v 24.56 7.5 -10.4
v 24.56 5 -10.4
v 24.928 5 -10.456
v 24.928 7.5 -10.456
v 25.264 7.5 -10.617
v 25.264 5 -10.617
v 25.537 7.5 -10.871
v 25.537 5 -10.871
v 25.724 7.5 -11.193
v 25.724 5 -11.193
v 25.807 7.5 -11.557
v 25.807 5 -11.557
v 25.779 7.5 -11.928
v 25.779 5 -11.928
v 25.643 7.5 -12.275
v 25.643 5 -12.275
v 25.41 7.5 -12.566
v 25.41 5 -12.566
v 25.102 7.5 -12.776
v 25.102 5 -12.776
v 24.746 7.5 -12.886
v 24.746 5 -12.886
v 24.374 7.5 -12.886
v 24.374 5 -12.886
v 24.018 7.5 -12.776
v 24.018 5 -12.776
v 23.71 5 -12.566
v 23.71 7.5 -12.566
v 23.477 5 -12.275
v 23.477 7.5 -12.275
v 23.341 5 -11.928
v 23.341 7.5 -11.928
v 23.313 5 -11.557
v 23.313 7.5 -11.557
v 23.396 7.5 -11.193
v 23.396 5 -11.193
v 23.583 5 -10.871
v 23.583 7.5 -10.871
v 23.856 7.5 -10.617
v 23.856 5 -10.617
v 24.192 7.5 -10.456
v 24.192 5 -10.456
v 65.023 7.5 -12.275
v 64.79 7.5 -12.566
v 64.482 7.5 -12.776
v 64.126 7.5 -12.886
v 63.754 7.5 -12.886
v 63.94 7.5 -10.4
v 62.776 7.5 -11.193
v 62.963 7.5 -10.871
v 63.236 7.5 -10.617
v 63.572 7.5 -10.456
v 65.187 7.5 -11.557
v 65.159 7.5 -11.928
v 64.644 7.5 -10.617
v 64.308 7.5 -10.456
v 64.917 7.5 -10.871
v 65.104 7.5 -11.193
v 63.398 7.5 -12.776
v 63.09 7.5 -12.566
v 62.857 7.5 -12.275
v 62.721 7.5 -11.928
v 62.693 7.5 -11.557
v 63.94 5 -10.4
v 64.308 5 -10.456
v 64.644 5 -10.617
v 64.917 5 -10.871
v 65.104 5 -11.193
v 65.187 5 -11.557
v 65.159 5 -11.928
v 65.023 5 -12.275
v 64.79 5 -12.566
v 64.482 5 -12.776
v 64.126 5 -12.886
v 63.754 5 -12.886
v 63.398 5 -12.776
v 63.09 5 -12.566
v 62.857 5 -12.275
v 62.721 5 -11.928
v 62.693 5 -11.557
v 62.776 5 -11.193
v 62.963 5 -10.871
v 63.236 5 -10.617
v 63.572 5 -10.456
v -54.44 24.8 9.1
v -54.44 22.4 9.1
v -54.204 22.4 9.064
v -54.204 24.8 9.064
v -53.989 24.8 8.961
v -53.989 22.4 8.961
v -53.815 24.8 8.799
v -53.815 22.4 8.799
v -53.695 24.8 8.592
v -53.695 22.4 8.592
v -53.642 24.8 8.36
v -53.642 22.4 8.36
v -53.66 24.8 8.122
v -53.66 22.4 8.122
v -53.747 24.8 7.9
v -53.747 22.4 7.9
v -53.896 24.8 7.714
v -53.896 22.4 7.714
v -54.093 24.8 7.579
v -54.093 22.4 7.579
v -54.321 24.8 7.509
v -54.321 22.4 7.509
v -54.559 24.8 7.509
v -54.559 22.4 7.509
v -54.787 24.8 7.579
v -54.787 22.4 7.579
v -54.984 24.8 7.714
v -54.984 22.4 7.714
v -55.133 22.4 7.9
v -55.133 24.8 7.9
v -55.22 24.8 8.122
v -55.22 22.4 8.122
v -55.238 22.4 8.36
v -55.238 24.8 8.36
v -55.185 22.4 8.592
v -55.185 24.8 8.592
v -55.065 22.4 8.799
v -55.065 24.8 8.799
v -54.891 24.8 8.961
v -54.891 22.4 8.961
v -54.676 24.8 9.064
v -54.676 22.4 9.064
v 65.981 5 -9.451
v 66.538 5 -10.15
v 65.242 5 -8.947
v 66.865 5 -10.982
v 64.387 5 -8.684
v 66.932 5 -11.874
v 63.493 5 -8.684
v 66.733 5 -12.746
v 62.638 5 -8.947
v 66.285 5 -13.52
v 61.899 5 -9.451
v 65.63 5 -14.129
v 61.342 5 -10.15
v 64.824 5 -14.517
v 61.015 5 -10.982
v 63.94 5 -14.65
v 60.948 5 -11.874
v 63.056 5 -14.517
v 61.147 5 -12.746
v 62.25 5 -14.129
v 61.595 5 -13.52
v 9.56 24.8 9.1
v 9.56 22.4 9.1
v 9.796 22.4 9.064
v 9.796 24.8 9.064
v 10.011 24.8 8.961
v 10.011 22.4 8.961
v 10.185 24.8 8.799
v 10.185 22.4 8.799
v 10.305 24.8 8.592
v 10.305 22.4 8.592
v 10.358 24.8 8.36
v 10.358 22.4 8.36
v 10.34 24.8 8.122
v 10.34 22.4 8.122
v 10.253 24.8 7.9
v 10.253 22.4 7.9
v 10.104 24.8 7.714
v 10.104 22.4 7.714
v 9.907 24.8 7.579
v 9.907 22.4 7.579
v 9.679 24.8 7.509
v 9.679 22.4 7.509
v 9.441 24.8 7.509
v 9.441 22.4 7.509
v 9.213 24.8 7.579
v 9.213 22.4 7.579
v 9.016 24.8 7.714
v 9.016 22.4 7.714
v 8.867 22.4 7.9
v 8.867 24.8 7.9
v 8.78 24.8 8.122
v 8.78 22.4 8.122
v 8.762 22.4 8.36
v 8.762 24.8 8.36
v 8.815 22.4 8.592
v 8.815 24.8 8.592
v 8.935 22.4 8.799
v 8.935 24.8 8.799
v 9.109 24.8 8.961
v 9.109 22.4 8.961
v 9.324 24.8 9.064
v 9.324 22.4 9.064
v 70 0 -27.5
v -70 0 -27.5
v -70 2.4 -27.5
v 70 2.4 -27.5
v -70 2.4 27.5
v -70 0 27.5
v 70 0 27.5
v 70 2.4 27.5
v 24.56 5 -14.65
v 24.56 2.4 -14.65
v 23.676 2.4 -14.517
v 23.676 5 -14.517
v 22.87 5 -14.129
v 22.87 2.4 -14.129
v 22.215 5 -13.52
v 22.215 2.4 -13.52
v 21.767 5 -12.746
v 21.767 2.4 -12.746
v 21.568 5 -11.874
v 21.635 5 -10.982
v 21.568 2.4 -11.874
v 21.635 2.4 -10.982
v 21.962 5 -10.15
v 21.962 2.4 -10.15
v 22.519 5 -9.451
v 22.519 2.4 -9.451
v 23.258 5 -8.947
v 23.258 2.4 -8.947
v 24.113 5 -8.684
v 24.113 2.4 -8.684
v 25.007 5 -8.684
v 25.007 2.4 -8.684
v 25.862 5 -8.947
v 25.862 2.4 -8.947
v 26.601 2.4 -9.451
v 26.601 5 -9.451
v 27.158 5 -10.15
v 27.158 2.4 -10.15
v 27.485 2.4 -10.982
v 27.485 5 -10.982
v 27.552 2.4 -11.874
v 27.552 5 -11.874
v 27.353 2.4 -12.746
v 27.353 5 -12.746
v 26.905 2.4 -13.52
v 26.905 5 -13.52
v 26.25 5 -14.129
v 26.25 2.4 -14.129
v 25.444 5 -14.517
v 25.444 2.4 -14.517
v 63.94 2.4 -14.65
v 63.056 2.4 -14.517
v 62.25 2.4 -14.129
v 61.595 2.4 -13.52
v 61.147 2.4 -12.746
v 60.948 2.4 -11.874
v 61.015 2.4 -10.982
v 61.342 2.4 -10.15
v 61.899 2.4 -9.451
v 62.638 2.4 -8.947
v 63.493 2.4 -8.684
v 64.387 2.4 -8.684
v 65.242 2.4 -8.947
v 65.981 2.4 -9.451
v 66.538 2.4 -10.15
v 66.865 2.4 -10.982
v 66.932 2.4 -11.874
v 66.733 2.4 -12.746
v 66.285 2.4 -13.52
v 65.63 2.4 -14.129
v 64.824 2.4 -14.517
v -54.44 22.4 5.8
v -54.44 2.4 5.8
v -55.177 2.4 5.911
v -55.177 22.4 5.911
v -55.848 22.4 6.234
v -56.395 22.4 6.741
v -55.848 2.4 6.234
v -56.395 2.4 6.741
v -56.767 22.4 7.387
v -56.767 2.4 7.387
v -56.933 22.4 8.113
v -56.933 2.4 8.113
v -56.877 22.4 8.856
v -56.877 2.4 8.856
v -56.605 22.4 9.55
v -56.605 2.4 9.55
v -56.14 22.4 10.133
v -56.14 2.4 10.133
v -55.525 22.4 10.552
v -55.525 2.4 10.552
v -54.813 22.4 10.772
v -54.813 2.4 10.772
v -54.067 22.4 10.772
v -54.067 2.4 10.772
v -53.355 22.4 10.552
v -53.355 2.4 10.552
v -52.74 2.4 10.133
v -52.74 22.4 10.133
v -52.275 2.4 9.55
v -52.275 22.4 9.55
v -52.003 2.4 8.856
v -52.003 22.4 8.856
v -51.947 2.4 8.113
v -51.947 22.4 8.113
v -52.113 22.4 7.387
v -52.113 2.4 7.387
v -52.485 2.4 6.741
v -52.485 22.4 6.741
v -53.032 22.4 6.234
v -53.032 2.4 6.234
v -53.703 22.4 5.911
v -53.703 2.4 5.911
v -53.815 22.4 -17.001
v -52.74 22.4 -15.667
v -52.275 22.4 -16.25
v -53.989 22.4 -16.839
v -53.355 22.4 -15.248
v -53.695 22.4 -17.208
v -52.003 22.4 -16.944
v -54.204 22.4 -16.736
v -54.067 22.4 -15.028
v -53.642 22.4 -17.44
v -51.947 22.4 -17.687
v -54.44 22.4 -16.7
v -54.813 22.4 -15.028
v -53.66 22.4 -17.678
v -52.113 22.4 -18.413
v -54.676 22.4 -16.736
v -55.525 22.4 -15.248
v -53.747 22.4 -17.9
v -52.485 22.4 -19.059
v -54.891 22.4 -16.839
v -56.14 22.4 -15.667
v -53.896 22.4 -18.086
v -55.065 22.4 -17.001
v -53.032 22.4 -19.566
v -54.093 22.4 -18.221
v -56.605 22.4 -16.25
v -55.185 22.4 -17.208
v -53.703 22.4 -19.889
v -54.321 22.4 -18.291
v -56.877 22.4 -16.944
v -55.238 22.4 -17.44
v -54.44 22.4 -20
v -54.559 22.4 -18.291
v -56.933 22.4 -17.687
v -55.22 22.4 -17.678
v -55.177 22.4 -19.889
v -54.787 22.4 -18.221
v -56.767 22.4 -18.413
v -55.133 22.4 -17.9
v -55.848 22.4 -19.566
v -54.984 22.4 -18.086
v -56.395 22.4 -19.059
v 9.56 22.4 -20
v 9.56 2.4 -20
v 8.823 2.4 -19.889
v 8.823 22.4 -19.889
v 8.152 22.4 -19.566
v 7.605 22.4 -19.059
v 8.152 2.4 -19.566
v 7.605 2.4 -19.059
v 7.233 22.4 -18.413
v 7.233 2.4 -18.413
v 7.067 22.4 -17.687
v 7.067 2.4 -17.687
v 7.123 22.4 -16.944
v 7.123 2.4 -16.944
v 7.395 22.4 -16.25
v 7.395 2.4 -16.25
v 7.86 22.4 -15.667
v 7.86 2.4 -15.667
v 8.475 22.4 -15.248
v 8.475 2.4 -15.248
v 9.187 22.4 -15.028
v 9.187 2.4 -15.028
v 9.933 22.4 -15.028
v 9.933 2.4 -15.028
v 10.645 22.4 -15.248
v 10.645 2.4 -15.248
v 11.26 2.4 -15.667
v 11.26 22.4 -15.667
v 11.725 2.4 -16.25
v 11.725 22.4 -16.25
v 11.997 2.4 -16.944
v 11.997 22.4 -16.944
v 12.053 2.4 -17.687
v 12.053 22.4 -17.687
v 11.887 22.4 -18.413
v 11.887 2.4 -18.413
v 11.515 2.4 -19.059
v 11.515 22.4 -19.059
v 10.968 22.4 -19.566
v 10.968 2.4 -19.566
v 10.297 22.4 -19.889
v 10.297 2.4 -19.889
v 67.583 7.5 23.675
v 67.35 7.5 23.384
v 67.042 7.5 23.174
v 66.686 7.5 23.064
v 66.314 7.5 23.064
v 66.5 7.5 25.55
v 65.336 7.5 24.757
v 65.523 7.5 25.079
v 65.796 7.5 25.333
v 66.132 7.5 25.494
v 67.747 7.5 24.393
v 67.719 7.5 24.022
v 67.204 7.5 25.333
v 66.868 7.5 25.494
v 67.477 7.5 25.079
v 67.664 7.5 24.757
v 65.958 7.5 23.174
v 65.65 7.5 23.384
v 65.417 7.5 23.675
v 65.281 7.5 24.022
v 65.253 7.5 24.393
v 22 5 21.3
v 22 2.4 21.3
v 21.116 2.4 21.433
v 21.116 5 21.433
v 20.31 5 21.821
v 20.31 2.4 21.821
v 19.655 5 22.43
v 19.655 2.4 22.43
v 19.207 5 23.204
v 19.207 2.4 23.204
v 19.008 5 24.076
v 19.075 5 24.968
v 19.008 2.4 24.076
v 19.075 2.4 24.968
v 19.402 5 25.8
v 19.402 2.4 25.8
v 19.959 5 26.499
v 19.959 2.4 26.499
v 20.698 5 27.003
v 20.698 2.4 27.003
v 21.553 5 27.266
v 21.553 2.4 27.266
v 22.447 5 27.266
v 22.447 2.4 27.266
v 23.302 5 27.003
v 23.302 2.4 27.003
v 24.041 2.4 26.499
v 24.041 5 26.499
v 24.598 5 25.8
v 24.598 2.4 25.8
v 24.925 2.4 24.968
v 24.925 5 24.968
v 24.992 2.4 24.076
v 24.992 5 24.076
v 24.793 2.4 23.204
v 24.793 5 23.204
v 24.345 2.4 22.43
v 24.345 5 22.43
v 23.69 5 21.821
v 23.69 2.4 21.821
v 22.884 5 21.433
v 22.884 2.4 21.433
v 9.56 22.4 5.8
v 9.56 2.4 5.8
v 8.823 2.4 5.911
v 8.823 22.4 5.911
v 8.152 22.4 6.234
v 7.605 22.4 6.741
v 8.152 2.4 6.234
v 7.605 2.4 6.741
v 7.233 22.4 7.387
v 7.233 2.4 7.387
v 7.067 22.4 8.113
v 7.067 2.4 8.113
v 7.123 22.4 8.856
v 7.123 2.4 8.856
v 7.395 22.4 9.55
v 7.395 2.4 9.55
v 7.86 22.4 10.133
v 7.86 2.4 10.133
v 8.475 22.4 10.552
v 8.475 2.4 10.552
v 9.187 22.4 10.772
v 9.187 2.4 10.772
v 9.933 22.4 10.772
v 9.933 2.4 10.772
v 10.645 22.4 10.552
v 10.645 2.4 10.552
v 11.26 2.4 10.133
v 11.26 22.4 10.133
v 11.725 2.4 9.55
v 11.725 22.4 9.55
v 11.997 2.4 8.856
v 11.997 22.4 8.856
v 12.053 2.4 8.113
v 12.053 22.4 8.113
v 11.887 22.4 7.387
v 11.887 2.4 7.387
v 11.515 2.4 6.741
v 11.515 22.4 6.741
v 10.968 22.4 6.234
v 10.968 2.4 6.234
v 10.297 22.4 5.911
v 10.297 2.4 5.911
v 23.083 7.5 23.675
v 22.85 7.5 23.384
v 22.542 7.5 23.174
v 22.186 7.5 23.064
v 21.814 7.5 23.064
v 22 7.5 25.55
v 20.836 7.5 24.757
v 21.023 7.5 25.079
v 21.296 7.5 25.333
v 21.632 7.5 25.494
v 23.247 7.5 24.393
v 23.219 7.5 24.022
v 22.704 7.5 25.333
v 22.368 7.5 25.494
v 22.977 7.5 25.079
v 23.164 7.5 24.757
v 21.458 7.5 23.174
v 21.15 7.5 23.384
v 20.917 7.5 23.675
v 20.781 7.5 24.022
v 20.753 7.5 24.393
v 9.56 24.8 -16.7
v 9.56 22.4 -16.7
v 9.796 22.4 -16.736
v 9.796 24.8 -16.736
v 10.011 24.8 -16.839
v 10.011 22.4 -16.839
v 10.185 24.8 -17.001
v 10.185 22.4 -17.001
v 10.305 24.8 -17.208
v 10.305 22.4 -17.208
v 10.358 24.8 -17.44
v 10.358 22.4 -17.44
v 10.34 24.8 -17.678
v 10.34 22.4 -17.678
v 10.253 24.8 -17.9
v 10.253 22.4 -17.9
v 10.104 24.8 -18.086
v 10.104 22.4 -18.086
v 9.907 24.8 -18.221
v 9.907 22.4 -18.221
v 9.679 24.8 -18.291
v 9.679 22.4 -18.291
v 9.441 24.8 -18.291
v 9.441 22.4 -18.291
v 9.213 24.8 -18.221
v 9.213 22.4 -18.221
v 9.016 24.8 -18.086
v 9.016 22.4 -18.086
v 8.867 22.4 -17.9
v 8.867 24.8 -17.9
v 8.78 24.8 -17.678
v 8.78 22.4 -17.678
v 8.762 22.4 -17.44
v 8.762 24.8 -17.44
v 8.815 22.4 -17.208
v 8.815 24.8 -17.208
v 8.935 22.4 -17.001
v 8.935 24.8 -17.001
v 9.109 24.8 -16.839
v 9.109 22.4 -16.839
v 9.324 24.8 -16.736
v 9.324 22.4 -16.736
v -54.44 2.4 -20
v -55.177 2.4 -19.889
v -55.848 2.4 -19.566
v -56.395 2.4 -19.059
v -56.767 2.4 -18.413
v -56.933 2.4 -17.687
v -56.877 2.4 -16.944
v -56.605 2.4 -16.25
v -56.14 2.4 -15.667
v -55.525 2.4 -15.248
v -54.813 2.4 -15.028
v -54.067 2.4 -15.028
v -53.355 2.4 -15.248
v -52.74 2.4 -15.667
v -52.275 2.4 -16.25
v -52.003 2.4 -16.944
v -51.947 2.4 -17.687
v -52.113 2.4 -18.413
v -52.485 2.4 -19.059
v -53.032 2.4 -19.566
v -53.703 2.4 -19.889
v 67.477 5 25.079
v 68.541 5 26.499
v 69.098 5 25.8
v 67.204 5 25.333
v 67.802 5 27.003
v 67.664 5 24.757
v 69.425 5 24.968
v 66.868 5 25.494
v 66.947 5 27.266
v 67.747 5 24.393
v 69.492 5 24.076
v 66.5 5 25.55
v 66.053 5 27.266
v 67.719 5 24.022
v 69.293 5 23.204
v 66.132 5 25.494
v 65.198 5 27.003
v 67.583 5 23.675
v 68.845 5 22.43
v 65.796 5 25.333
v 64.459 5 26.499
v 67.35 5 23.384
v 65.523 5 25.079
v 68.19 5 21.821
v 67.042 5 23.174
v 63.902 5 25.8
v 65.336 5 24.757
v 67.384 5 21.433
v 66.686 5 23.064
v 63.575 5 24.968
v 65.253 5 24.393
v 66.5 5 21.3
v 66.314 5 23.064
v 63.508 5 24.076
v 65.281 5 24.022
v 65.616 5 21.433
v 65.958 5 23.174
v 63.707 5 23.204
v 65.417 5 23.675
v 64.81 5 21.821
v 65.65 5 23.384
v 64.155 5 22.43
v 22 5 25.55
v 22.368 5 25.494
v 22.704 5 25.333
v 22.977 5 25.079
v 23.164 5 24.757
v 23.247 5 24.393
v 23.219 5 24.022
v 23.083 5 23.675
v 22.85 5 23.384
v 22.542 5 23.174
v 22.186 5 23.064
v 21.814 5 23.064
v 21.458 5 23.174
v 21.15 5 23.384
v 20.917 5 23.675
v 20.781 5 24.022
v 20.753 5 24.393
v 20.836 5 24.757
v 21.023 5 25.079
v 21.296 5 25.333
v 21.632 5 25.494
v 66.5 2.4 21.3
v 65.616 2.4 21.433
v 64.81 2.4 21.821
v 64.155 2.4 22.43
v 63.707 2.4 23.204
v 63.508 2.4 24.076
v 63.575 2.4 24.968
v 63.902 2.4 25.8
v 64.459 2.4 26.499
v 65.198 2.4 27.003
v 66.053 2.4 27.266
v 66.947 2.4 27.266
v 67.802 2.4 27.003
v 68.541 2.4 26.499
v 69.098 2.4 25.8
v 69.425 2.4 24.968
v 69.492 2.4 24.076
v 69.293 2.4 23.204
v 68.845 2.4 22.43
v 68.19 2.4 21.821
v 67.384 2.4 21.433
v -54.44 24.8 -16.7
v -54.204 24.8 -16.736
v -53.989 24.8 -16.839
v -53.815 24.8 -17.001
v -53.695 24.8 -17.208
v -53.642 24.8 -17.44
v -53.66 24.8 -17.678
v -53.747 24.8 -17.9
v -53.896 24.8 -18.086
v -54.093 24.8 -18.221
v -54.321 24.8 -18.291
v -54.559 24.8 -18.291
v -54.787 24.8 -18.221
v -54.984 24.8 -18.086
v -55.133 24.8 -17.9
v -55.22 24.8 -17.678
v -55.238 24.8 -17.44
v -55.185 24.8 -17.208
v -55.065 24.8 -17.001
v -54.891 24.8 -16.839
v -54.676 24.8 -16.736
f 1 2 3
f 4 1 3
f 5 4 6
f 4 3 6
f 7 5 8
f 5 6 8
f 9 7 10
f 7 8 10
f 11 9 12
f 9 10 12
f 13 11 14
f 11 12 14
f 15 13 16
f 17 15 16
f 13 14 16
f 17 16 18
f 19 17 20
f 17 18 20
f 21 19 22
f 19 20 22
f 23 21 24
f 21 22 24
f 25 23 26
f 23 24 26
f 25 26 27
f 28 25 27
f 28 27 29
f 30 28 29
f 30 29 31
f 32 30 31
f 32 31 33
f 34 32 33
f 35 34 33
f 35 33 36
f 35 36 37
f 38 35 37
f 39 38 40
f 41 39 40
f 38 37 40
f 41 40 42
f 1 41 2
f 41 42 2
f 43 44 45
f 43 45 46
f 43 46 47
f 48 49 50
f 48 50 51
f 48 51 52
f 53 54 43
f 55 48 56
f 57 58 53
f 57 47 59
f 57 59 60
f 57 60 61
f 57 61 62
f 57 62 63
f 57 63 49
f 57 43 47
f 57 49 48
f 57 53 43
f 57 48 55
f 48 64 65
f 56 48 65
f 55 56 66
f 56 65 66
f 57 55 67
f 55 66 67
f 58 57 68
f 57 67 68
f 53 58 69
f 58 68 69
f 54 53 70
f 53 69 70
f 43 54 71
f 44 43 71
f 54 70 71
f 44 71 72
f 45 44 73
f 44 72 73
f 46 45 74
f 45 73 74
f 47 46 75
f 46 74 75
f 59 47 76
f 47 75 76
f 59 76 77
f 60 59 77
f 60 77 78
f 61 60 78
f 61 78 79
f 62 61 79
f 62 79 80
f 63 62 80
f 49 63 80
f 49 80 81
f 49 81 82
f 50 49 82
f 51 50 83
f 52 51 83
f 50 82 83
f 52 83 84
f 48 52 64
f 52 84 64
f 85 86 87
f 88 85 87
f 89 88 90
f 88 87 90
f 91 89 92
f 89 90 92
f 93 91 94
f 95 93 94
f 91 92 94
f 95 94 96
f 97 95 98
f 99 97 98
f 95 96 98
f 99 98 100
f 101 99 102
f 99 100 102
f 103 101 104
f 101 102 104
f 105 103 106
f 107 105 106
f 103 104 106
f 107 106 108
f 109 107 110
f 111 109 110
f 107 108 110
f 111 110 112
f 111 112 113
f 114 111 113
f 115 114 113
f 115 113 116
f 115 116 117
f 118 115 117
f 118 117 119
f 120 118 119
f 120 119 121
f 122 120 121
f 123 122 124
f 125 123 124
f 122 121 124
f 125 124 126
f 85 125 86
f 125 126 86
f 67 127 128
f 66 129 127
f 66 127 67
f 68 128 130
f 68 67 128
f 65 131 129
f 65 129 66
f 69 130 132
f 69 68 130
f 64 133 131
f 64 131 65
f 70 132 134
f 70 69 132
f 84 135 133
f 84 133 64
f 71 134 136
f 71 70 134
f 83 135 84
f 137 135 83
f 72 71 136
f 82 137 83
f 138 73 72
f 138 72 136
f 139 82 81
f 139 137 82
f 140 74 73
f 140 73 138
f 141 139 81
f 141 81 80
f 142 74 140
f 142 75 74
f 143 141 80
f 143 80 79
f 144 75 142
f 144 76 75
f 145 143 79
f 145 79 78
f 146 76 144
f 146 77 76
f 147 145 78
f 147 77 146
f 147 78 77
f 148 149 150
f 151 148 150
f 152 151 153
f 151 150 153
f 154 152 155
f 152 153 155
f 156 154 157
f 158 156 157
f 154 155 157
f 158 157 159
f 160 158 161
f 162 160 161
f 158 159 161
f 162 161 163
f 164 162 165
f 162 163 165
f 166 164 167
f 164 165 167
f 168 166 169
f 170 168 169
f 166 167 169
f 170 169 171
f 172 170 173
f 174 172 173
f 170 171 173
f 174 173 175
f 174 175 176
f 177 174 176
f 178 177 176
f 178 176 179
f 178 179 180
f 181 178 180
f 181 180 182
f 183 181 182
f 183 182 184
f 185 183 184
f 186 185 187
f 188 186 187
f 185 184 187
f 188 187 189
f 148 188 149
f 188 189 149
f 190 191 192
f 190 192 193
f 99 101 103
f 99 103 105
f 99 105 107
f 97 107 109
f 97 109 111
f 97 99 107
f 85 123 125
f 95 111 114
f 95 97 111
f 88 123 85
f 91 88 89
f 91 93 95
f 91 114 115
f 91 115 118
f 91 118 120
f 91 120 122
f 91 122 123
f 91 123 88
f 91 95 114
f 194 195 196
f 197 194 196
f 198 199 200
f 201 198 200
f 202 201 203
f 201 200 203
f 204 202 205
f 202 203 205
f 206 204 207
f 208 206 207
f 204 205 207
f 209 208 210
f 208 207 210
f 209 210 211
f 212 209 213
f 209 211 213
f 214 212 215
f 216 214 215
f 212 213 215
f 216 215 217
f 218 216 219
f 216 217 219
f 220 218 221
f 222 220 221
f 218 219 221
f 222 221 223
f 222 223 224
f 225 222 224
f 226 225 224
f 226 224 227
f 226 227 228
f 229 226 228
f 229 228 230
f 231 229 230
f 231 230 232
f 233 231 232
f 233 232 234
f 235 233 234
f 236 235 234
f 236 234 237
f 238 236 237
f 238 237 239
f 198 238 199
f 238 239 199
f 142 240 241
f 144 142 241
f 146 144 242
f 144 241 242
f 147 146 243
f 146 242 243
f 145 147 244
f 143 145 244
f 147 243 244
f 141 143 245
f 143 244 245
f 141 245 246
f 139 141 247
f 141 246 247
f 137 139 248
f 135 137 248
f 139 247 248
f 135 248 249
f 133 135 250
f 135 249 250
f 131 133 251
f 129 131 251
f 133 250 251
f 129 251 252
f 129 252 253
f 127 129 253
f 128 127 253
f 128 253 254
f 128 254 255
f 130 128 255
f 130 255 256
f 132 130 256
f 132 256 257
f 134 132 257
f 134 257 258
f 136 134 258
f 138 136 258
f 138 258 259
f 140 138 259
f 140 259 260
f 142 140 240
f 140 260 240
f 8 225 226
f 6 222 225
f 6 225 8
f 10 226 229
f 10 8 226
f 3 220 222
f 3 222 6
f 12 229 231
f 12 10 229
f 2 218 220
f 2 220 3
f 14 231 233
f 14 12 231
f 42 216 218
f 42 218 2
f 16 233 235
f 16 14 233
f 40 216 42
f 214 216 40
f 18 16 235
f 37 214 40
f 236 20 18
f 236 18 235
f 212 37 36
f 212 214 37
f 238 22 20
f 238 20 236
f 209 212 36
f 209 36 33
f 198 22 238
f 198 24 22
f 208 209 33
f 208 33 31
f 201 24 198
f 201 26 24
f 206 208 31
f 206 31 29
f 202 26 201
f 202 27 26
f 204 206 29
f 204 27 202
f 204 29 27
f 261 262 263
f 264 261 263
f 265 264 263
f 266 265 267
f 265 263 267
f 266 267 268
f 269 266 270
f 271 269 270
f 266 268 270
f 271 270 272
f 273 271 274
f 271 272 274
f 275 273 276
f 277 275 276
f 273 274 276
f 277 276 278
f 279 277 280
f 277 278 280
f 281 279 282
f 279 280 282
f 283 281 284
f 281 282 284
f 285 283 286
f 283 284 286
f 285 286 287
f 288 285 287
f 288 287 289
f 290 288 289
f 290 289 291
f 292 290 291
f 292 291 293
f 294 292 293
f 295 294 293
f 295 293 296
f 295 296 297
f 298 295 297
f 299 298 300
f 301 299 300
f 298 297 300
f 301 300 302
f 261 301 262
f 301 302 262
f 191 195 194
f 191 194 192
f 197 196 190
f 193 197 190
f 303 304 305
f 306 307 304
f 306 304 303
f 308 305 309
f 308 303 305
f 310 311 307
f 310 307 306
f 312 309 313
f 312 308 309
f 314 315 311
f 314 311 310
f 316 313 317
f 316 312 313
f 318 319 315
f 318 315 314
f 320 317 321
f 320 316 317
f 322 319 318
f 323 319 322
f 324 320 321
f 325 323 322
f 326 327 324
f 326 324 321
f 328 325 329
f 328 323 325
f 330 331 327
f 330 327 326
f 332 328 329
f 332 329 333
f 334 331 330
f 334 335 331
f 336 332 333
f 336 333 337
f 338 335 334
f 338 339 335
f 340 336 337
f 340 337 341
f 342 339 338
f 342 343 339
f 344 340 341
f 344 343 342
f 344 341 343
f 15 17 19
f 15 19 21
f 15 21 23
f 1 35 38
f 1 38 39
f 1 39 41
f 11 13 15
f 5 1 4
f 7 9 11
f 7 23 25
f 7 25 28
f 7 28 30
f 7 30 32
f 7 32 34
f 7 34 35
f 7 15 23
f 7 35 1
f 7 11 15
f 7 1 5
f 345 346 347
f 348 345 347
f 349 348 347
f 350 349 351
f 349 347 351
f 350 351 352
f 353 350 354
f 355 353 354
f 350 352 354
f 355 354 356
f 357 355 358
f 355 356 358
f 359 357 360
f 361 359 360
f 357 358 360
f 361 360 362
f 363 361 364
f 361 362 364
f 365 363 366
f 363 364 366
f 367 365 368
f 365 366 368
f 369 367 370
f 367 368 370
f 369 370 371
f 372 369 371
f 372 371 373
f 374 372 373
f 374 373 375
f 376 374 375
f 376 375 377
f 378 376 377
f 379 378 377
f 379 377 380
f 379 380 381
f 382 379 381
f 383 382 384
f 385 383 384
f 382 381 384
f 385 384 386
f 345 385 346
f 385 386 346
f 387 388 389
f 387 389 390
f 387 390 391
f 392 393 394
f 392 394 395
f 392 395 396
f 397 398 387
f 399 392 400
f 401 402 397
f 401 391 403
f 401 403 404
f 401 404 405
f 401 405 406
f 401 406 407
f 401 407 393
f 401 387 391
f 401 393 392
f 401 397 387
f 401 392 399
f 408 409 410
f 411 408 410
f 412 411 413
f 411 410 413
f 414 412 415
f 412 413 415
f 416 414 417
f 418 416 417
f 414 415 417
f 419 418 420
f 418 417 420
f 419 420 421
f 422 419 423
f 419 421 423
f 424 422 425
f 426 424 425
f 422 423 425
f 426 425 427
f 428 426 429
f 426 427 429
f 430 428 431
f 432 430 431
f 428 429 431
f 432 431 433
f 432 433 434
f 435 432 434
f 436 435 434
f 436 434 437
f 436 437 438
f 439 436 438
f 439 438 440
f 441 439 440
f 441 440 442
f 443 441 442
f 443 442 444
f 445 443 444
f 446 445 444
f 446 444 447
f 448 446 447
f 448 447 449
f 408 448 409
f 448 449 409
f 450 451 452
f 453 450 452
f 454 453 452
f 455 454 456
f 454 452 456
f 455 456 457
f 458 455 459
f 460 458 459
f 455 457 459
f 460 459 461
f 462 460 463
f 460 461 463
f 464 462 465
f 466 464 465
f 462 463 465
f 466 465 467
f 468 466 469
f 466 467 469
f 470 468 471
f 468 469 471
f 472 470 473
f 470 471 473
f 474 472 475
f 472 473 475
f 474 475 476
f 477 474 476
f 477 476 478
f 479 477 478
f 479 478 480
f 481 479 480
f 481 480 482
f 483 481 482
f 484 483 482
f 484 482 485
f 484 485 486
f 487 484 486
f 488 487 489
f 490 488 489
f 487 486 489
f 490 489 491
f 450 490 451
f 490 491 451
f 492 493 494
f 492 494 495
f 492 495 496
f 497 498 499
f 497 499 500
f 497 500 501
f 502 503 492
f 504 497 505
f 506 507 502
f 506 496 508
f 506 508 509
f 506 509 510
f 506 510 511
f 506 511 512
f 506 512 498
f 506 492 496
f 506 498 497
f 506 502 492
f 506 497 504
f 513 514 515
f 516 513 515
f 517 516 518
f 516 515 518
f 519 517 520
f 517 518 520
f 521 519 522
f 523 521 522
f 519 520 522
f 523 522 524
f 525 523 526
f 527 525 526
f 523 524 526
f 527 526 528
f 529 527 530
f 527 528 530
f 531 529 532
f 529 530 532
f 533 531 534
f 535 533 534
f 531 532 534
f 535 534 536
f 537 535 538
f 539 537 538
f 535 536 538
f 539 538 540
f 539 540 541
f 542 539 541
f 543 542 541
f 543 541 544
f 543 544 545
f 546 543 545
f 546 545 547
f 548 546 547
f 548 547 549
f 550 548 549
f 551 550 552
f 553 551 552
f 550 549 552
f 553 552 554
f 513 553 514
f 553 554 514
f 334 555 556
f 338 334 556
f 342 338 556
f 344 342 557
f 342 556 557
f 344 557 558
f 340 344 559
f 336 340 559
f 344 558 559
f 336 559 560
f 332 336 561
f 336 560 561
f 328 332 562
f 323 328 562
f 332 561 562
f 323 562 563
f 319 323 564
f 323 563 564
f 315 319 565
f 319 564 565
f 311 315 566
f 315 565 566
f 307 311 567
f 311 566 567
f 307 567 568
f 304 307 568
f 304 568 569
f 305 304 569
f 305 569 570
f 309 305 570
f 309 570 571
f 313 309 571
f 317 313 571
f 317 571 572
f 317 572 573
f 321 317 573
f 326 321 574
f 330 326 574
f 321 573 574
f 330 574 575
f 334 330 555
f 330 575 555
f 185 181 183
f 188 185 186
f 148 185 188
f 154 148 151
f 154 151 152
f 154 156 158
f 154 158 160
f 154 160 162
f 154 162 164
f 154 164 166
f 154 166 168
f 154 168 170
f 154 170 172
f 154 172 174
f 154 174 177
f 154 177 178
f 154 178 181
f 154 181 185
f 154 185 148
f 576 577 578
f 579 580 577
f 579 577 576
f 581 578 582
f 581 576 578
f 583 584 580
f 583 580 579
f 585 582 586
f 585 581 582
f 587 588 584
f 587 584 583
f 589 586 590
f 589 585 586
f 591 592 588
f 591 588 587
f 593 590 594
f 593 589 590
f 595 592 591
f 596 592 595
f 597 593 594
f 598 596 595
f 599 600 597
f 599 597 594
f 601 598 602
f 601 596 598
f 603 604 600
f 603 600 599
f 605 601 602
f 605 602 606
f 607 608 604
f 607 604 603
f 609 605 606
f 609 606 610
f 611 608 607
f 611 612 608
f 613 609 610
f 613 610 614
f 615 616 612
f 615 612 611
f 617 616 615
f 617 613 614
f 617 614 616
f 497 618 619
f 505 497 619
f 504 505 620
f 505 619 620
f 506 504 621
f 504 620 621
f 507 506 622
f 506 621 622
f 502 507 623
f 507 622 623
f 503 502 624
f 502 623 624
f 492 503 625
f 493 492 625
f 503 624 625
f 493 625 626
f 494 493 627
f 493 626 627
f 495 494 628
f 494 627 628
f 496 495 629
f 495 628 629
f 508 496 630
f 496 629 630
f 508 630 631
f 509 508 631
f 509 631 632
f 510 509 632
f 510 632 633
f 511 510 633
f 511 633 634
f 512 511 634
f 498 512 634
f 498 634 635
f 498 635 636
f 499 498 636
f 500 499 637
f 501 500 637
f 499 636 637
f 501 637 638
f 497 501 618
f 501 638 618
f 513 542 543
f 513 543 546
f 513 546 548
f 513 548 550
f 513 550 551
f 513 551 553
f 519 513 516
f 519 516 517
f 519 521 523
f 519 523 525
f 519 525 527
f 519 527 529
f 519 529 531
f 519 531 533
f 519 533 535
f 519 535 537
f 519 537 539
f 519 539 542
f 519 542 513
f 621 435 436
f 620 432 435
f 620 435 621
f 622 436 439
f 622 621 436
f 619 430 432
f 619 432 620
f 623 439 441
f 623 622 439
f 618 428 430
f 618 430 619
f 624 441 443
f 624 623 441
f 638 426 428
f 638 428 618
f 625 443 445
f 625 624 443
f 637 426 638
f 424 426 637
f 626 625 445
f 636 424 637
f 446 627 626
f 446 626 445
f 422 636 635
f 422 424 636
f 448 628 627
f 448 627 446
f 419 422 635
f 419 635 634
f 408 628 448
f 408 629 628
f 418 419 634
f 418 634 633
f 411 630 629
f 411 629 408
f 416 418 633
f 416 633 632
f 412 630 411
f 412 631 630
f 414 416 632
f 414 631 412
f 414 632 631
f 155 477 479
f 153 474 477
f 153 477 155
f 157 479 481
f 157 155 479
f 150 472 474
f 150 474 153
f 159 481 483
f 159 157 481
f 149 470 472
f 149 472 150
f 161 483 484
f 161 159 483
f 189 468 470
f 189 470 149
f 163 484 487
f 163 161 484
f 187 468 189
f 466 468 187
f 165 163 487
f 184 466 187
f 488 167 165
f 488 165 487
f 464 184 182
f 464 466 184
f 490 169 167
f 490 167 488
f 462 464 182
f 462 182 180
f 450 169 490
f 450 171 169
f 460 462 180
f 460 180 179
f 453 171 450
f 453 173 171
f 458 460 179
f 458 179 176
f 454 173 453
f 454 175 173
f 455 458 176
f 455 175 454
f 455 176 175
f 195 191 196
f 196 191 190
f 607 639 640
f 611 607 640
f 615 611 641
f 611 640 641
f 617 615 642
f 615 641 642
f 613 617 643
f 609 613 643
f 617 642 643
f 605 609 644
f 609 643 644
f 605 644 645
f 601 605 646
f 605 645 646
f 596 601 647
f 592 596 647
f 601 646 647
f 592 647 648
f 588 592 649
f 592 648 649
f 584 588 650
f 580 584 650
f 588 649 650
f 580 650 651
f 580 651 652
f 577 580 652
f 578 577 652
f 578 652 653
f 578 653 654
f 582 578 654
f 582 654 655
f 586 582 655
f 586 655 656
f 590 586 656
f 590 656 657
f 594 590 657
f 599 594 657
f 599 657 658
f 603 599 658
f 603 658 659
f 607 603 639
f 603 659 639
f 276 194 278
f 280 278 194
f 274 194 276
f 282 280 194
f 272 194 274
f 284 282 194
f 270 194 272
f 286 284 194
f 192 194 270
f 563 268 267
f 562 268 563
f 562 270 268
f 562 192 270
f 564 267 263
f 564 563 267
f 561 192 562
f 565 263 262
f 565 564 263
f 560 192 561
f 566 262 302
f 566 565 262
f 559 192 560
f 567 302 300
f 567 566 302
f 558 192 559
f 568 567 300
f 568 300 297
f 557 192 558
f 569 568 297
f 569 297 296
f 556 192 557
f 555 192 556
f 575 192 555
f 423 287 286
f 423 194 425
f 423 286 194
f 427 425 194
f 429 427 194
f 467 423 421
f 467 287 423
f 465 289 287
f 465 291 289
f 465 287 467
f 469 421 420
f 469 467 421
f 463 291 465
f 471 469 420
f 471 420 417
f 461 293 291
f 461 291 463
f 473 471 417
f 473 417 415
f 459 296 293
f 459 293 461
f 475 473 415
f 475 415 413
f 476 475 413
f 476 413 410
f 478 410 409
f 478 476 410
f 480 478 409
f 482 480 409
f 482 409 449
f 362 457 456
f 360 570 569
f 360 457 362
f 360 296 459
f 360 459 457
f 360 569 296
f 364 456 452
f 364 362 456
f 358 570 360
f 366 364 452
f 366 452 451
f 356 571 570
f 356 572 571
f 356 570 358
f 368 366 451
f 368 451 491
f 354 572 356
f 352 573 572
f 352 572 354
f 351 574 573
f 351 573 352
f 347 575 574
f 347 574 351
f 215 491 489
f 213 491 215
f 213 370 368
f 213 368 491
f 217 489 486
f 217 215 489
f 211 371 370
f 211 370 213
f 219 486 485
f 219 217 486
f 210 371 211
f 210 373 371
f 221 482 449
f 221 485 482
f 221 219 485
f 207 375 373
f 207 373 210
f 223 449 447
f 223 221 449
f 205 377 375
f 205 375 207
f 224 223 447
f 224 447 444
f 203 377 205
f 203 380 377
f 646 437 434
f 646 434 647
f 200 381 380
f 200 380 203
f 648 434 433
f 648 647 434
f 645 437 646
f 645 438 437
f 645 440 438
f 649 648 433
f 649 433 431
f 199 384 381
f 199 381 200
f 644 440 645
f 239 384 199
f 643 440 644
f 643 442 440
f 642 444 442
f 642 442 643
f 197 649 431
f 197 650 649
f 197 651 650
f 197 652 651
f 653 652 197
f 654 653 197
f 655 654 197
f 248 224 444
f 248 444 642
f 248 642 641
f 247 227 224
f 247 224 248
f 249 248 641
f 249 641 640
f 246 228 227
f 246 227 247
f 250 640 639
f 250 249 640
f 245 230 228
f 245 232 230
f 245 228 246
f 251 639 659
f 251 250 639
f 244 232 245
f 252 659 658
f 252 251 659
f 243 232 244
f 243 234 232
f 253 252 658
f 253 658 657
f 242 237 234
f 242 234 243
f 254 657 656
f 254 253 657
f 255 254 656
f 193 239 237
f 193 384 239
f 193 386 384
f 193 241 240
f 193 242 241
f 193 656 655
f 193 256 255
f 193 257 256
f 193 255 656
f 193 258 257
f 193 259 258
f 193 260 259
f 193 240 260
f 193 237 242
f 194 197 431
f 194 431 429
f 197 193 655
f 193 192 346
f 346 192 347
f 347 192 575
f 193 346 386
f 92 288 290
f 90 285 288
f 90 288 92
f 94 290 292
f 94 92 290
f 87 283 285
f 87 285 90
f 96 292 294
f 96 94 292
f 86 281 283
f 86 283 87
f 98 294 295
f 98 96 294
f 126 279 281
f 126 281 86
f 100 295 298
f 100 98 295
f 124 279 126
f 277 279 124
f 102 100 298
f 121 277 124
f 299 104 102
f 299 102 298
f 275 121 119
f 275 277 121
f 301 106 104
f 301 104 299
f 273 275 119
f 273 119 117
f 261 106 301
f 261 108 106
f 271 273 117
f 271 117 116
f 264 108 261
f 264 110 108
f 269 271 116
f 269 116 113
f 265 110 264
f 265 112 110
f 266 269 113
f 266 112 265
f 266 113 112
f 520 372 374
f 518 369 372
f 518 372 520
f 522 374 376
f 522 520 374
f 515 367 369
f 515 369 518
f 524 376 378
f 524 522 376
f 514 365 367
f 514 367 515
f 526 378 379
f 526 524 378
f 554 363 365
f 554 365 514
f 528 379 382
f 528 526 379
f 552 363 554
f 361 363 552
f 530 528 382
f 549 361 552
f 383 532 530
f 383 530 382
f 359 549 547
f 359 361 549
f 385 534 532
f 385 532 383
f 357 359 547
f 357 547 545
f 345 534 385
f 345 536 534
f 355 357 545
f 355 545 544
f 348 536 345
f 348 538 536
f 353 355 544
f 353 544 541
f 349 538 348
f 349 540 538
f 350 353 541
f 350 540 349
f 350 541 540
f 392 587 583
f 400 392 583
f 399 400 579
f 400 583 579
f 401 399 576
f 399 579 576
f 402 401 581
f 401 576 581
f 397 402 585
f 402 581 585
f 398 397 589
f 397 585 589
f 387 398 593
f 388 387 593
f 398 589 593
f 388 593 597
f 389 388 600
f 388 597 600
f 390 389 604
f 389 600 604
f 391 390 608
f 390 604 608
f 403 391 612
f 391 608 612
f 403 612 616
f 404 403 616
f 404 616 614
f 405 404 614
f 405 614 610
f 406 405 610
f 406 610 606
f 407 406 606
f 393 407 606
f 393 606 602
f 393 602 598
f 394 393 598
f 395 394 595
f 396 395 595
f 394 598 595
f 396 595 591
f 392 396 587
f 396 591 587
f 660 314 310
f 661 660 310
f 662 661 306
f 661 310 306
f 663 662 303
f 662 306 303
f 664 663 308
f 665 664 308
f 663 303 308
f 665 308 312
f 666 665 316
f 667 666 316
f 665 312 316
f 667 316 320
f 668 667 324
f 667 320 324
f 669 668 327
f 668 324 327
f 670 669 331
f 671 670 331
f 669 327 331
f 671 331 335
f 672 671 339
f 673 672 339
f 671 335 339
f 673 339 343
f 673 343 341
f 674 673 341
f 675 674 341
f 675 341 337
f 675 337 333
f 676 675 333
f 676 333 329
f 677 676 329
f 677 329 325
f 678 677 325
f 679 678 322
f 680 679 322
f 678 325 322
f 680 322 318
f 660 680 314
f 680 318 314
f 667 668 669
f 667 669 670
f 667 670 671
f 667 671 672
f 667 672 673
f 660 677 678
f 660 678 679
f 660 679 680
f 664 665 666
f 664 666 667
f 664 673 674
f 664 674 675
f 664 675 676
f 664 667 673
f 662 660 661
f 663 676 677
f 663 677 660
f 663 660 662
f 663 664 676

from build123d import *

# Parameters (mm, degrees)
SKETCH1_W           = 140
SKETCH1_H           = 55
BOSS_EXTRUDE1_DEPTH = 2.4
SKETCH2_R           = 3
BOSS_EXTRUDE2_DEPTH = 2.6
SKETCH3_R           = 1.25
BOSS_EXTRUDE3_DEPTH = 2.5
SKETCH4_R           = 2.5
BOSS_EXTRUDE4_DEPTH = 20
SKETCH5_R           = 0.8
BOSS_EXTRUDE5_DEPTH = 2.4


with BuildPart() as part:
    # Sketch1 → Boss-Extrude1 (new body)
    with BuildSketch(Plane(origin=(0, 0, 0), x_dir=(1, 0, 0), z_dir=(0, 1, 0))):
        Rectangle(SKETCH1_W, SKETCH1_H)
    extrude(amount=BOSS_EXTRUDE1_DEPTH)

    # Sketch2 → Boss-Extrude2 (add)
    with BuildSketch(Plane(origin=(0, 2.4, 0), x_dir=(1, 0, 0), z_dir=(0, 1, 0))):
        with Locations(Location((66.5, -24.3, 0), (0, 0, 90))):
            Circle(SKETCH2_R)
        with Locations(Location((63.94, 11.65, 0), (0, 0, 90))):
            Circle(SKETCH2_R)
        with Locations(Location((22, -24.3, 0), (0, 0, 90))):
            Circle(SKETCH2_R)
        with Locations(Location((24.56, 11.65, 0), (0, 0, 90))):
            Circle(SKETCH2_R)
    extrude(amount=BOSS_EXTRUDE2_DEPTH)

    # Sketch3 → Boss-Extrude3 (add)
    with BuildSketch(Plane(origin=(0, 5, 0), x_dir=(1, 0, 0), z_dir=(0, 1, 0))):
        with Locations(Location((22, -24.3, 0), (0, 0, 270))):
            Circle(SKETCH3_R)
        with Locations(Location((24.56, 11.65, 0), (0, 0, 270))):
            Circle(SKETCH3_R)
        with Locations(Location((66.5, -24.3, 0), (0, 0, 270))):
            Circle(SKETCH3_R)
        with Locations(Location((63.94, 11.65, 0), (0, 0, 270))):
            Circle(SKETCH3_R)
    extrude(amount=BOSS_EXTRUDE3_DEPTH)

    # Sketch4 → Boss-Extrude4 (add)
    with BuildSketch(Plane(origin=(0, 2.4, 0), x_dir=(1, 0, 0), z_dir=(0, 1, 0))):
        with Locations(Location((9.56, 17.5, 0), (0, 0, 90))):
            Circle(SKETCH4_R)
        with Locations(Location((-54.44, 17.5, 0), (0, 0, 90))):
            Circle(SKETCH4_R)
        with Locations(Location((-54.44, -8.3, 0), (0, 0, 90))):
            Circle(SKETCH4_R)
        with Locations(Location((9.56, -8.3, 0), (0, 0, 90))):
            Circle(SKETCH4_R)
    extrude(amount=BOSS_EXTRUDE4_DEPTH)

    # Sketch5 → Boss-Extrude5 (add)
    with BuildSketch(Plane(origin=(0, 22.4, 0), x_dir=(1, 0, 0), z_dir=(0, 1, 0))):
        with Locations(Location((9.56, -8.3, 0), (0, 0, 270))):
            Circle(SKETCH5_R)
        with Locations(Location((9.56, 17.5, 0), (0, 0, 270))):
            Circle(SKETCH5_R)
        with Locations(Location((-54.44, 17.5, 0), (0, 0, 270))):
            Circle(SKETCH5_R)
        with Locations(Location((-54.44, -8.3, 0), (0, 0, 270))):
            Circle(SKETCH5_R)
    extrude(amount=BOSS_EXTRUDE5_DEPTH)


solid = part.part
